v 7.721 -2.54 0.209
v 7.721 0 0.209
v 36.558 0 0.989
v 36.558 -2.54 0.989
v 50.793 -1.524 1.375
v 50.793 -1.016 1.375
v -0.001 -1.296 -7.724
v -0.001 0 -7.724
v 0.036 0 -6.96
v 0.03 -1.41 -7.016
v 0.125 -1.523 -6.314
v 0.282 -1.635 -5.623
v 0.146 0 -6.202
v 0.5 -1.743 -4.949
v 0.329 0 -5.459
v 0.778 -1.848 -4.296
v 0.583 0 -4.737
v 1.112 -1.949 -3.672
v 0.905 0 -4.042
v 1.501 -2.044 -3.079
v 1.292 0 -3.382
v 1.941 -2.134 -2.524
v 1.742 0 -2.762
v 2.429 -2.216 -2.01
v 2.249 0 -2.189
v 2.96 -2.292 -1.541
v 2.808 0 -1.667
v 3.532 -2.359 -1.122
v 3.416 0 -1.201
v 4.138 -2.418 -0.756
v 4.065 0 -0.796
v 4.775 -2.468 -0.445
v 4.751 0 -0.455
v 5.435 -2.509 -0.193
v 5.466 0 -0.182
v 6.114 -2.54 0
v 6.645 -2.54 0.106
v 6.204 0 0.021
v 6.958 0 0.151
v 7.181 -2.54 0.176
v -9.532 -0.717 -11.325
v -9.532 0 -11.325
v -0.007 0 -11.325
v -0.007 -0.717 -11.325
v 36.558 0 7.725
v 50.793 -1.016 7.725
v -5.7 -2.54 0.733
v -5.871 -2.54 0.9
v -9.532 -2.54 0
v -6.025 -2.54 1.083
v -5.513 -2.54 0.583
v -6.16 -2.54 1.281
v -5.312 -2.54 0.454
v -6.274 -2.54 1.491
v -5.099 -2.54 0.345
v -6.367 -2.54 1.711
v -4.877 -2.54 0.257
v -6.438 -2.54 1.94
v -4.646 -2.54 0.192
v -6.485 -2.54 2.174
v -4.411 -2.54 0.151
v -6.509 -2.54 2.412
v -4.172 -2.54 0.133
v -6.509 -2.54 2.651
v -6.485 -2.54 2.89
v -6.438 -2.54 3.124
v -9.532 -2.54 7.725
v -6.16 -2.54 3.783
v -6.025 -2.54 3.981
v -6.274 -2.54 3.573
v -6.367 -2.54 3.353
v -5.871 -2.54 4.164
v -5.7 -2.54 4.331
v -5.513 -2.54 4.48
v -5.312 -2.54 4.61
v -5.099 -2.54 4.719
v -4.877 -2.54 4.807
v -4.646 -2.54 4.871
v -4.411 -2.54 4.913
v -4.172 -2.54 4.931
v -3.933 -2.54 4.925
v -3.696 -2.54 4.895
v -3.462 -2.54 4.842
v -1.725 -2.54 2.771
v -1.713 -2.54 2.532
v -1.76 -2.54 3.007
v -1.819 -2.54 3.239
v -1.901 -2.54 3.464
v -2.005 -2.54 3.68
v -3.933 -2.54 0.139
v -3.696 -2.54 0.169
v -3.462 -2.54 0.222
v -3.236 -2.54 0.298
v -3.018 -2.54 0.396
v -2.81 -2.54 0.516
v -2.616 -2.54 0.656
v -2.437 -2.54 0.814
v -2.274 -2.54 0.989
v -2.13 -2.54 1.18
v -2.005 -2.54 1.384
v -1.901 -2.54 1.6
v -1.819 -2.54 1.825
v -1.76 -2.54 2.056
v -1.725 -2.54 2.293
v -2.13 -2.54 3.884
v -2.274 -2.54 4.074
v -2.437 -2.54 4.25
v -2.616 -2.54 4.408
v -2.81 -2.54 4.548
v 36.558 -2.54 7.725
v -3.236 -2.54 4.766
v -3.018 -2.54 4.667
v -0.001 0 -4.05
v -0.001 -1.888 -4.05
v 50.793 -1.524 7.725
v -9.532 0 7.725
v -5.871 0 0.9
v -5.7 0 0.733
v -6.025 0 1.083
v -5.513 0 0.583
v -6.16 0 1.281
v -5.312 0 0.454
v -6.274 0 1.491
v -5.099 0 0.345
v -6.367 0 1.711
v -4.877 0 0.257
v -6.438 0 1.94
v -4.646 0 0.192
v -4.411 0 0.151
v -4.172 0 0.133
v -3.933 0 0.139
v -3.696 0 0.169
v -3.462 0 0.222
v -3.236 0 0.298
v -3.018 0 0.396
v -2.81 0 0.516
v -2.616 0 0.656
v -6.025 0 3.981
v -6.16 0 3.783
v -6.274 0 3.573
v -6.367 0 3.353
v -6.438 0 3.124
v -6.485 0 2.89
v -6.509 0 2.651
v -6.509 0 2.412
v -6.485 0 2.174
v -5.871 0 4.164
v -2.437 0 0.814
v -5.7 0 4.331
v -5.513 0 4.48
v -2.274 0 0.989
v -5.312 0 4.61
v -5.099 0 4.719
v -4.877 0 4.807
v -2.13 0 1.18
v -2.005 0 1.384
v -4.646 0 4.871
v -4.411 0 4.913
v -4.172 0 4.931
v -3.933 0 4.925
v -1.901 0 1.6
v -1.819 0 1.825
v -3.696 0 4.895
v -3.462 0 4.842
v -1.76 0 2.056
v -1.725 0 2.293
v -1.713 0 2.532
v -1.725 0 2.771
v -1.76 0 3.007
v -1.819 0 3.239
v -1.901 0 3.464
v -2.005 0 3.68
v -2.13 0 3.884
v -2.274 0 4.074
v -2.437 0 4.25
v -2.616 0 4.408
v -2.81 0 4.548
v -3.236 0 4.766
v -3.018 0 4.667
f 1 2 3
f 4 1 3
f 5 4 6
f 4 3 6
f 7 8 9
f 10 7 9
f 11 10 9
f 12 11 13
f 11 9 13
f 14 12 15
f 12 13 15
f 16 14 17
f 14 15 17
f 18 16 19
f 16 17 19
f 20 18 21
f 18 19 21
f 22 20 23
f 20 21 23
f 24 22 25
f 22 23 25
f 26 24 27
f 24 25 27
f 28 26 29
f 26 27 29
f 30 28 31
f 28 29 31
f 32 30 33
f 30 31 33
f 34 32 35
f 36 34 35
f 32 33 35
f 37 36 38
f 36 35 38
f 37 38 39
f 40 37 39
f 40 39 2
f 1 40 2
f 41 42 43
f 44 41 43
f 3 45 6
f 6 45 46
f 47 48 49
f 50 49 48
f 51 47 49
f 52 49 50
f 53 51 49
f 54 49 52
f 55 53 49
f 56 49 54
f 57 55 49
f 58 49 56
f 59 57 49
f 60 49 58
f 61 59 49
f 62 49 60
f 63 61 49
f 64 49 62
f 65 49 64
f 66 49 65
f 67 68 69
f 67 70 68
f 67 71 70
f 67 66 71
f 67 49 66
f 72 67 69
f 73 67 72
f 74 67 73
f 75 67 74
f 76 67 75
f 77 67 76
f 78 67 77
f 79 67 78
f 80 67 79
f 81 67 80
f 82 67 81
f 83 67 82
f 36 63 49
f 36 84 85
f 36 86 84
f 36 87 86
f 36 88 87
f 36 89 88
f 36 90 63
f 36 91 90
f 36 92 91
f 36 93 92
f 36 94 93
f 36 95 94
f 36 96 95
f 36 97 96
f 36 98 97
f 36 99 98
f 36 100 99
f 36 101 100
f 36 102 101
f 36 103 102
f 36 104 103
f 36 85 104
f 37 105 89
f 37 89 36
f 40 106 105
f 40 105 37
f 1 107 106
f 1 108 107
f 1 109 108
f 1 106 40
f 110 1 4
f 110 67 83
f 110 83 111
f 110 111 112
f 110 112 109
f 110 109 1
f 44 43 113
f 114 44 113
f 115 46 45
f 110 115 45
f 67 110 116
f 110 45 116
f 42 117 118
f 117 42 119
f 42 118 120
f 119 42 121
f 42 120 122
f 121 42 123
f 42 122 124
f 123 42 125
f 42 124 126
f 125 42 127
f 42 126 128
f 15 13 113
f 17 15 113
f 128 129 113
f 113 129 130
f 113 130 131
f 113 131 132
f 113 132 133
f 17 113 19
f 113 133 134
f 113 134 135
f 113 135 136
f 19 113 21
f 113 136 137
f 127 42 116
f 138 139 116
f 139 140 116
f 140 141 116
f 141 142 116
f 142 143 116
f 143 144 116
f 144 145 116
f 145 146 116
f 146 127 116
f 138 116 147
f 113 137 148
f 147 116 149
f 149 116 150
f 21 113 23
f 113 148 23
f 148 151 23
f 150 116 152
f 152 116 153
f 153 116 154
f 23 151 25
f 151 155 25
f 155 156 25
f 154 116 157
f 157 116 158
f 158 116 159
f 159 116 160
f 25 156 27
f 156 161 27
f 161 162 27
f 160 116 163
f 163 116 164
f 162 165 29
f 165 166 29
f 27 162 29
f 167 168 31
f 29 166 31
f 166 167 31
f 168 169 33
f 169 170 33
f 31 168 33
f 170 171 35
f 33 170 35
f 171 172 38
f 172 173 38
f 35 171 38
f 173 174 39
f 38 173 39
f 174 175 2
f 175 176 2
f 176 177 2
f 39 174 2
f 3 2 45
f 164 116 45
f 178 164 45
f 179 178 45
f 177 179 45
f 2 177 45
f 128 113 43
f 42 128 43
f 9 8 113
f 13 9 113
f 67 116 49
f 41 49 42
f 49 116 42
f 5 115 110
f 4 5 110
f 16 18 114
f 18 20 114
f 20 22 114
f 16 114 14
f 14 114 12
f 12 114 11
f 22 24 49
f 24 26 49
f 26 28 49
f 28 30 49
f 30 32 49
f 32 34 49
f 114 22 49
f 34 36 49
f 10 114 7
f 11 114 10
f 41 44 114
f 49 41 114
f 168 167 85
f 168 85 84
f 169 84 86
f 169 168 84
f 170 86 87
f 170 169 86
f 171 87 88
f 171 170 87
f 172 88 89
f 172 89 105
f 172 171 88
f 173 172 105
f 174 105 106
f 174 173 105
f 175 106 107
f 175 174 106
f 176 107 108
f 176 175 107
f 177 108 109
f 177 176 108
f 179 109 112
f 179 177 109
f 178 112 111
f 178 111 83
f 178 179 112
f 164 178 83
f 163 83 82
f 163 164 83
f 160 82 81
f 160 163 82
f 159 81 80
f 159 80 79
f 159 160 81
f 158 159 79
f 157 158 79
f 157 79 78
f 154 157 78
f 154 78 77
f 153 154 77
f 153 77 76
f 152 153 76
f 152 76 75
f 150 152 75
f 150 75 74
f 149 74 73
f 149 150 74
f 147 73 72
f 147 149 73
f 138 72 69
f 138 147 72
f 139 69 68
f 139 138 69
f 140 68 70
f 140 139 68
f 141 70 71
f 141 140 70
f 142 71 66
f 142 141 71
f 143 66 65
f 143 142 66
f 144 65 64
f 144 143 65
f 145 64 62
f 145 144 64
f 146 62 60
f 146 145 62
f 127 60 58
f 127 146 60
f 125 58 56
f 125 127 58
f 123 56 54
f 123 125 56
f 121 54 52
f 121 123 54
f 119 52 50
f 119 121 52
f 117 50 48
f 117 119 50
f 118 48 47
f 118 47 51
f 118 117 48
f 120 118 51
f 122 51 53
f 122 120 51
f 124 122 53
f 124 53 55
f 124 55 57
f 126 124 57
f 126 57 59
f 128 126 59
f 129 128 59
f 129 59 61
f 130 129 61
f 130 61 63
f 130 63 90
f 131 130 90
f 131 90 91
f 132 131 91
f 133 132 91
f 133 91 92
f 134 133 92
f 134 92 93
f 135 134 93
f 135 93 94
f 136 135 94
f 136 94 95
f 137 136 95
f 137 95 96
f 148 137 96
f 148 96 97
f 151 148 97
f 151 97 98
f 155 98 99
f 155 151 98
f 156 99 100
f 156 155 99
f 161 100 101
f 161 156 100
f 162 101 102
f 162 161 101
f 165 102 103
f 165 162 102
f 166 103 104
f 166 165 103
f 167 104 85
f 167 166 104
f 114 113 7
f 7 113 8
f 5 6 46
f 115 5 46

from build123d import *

# Parameters (mm, degrees)
F0_R     = 2.399673
F1_DEPTH = 2.54
F3_DEPTH = 25.4
F5_DEPTH = 25.4


with BuildPart() as f1:
    # F0 (on Front) → F1 (new body)
    with BuildSketch(Plane.XZ):
        with BuildLine():
            Line((50.793077, 7.724595), (-9.531923, 7.724595))
            Line((-9.531923, 7.724595), (-9.531923, -11.325405))
            Line((-9.531923, -11.325405), (-0.006923, -11.325405))
            Line((-0.006923, -11.325405), (-0.000719, -4.049985))
            Line((-0.000719, -4.049985), (-0.001371, -7.724225))
            ThreePointArc((-0.001371, -7.724225), (2.248548, -2.188908), (7.721398, 0.208962))
            Line((7.721398, 0.208962), (50.793077, 1.374595))
            Line((50.793077, 1.374595), (50.793077, 7.724595))
        make_face()
        with Locations((-4.112308, 2.531883)):
            Circle(F0_R, mode=Mode.SUBTRACT)
    extrude(amount=F1_DEPTH)

    # F2 (on face) → F3 (cut)
    with BuildSketch(Plane(origin=(-9.531923, 0, 0), x_dir=(0, -1, 0), z_dir=(-1, 0, 0))):
        Polygon((2.54, -11.325405), (2.54, 0), (0.716685, -11.325405), align=None)
    extrude(amount=-F3_DEPTH, mode=Mode.SUBTRACT)

    # F4 (on face) → F5 (cut)
    with BuildSketch(Plane.XY.offset(7.724595)):
        Polygon((50.793077, 0), (36.557514, 0), (50.793077, -1.016), align=None)
        Polygon((50.793077, -1.524), (36.557514, -2.54), (50.793077, -2.54), align=None)
    extrude(amount=-F5_DEPTH, mode=Mode.SUBTRACT)


solid = f1.part
